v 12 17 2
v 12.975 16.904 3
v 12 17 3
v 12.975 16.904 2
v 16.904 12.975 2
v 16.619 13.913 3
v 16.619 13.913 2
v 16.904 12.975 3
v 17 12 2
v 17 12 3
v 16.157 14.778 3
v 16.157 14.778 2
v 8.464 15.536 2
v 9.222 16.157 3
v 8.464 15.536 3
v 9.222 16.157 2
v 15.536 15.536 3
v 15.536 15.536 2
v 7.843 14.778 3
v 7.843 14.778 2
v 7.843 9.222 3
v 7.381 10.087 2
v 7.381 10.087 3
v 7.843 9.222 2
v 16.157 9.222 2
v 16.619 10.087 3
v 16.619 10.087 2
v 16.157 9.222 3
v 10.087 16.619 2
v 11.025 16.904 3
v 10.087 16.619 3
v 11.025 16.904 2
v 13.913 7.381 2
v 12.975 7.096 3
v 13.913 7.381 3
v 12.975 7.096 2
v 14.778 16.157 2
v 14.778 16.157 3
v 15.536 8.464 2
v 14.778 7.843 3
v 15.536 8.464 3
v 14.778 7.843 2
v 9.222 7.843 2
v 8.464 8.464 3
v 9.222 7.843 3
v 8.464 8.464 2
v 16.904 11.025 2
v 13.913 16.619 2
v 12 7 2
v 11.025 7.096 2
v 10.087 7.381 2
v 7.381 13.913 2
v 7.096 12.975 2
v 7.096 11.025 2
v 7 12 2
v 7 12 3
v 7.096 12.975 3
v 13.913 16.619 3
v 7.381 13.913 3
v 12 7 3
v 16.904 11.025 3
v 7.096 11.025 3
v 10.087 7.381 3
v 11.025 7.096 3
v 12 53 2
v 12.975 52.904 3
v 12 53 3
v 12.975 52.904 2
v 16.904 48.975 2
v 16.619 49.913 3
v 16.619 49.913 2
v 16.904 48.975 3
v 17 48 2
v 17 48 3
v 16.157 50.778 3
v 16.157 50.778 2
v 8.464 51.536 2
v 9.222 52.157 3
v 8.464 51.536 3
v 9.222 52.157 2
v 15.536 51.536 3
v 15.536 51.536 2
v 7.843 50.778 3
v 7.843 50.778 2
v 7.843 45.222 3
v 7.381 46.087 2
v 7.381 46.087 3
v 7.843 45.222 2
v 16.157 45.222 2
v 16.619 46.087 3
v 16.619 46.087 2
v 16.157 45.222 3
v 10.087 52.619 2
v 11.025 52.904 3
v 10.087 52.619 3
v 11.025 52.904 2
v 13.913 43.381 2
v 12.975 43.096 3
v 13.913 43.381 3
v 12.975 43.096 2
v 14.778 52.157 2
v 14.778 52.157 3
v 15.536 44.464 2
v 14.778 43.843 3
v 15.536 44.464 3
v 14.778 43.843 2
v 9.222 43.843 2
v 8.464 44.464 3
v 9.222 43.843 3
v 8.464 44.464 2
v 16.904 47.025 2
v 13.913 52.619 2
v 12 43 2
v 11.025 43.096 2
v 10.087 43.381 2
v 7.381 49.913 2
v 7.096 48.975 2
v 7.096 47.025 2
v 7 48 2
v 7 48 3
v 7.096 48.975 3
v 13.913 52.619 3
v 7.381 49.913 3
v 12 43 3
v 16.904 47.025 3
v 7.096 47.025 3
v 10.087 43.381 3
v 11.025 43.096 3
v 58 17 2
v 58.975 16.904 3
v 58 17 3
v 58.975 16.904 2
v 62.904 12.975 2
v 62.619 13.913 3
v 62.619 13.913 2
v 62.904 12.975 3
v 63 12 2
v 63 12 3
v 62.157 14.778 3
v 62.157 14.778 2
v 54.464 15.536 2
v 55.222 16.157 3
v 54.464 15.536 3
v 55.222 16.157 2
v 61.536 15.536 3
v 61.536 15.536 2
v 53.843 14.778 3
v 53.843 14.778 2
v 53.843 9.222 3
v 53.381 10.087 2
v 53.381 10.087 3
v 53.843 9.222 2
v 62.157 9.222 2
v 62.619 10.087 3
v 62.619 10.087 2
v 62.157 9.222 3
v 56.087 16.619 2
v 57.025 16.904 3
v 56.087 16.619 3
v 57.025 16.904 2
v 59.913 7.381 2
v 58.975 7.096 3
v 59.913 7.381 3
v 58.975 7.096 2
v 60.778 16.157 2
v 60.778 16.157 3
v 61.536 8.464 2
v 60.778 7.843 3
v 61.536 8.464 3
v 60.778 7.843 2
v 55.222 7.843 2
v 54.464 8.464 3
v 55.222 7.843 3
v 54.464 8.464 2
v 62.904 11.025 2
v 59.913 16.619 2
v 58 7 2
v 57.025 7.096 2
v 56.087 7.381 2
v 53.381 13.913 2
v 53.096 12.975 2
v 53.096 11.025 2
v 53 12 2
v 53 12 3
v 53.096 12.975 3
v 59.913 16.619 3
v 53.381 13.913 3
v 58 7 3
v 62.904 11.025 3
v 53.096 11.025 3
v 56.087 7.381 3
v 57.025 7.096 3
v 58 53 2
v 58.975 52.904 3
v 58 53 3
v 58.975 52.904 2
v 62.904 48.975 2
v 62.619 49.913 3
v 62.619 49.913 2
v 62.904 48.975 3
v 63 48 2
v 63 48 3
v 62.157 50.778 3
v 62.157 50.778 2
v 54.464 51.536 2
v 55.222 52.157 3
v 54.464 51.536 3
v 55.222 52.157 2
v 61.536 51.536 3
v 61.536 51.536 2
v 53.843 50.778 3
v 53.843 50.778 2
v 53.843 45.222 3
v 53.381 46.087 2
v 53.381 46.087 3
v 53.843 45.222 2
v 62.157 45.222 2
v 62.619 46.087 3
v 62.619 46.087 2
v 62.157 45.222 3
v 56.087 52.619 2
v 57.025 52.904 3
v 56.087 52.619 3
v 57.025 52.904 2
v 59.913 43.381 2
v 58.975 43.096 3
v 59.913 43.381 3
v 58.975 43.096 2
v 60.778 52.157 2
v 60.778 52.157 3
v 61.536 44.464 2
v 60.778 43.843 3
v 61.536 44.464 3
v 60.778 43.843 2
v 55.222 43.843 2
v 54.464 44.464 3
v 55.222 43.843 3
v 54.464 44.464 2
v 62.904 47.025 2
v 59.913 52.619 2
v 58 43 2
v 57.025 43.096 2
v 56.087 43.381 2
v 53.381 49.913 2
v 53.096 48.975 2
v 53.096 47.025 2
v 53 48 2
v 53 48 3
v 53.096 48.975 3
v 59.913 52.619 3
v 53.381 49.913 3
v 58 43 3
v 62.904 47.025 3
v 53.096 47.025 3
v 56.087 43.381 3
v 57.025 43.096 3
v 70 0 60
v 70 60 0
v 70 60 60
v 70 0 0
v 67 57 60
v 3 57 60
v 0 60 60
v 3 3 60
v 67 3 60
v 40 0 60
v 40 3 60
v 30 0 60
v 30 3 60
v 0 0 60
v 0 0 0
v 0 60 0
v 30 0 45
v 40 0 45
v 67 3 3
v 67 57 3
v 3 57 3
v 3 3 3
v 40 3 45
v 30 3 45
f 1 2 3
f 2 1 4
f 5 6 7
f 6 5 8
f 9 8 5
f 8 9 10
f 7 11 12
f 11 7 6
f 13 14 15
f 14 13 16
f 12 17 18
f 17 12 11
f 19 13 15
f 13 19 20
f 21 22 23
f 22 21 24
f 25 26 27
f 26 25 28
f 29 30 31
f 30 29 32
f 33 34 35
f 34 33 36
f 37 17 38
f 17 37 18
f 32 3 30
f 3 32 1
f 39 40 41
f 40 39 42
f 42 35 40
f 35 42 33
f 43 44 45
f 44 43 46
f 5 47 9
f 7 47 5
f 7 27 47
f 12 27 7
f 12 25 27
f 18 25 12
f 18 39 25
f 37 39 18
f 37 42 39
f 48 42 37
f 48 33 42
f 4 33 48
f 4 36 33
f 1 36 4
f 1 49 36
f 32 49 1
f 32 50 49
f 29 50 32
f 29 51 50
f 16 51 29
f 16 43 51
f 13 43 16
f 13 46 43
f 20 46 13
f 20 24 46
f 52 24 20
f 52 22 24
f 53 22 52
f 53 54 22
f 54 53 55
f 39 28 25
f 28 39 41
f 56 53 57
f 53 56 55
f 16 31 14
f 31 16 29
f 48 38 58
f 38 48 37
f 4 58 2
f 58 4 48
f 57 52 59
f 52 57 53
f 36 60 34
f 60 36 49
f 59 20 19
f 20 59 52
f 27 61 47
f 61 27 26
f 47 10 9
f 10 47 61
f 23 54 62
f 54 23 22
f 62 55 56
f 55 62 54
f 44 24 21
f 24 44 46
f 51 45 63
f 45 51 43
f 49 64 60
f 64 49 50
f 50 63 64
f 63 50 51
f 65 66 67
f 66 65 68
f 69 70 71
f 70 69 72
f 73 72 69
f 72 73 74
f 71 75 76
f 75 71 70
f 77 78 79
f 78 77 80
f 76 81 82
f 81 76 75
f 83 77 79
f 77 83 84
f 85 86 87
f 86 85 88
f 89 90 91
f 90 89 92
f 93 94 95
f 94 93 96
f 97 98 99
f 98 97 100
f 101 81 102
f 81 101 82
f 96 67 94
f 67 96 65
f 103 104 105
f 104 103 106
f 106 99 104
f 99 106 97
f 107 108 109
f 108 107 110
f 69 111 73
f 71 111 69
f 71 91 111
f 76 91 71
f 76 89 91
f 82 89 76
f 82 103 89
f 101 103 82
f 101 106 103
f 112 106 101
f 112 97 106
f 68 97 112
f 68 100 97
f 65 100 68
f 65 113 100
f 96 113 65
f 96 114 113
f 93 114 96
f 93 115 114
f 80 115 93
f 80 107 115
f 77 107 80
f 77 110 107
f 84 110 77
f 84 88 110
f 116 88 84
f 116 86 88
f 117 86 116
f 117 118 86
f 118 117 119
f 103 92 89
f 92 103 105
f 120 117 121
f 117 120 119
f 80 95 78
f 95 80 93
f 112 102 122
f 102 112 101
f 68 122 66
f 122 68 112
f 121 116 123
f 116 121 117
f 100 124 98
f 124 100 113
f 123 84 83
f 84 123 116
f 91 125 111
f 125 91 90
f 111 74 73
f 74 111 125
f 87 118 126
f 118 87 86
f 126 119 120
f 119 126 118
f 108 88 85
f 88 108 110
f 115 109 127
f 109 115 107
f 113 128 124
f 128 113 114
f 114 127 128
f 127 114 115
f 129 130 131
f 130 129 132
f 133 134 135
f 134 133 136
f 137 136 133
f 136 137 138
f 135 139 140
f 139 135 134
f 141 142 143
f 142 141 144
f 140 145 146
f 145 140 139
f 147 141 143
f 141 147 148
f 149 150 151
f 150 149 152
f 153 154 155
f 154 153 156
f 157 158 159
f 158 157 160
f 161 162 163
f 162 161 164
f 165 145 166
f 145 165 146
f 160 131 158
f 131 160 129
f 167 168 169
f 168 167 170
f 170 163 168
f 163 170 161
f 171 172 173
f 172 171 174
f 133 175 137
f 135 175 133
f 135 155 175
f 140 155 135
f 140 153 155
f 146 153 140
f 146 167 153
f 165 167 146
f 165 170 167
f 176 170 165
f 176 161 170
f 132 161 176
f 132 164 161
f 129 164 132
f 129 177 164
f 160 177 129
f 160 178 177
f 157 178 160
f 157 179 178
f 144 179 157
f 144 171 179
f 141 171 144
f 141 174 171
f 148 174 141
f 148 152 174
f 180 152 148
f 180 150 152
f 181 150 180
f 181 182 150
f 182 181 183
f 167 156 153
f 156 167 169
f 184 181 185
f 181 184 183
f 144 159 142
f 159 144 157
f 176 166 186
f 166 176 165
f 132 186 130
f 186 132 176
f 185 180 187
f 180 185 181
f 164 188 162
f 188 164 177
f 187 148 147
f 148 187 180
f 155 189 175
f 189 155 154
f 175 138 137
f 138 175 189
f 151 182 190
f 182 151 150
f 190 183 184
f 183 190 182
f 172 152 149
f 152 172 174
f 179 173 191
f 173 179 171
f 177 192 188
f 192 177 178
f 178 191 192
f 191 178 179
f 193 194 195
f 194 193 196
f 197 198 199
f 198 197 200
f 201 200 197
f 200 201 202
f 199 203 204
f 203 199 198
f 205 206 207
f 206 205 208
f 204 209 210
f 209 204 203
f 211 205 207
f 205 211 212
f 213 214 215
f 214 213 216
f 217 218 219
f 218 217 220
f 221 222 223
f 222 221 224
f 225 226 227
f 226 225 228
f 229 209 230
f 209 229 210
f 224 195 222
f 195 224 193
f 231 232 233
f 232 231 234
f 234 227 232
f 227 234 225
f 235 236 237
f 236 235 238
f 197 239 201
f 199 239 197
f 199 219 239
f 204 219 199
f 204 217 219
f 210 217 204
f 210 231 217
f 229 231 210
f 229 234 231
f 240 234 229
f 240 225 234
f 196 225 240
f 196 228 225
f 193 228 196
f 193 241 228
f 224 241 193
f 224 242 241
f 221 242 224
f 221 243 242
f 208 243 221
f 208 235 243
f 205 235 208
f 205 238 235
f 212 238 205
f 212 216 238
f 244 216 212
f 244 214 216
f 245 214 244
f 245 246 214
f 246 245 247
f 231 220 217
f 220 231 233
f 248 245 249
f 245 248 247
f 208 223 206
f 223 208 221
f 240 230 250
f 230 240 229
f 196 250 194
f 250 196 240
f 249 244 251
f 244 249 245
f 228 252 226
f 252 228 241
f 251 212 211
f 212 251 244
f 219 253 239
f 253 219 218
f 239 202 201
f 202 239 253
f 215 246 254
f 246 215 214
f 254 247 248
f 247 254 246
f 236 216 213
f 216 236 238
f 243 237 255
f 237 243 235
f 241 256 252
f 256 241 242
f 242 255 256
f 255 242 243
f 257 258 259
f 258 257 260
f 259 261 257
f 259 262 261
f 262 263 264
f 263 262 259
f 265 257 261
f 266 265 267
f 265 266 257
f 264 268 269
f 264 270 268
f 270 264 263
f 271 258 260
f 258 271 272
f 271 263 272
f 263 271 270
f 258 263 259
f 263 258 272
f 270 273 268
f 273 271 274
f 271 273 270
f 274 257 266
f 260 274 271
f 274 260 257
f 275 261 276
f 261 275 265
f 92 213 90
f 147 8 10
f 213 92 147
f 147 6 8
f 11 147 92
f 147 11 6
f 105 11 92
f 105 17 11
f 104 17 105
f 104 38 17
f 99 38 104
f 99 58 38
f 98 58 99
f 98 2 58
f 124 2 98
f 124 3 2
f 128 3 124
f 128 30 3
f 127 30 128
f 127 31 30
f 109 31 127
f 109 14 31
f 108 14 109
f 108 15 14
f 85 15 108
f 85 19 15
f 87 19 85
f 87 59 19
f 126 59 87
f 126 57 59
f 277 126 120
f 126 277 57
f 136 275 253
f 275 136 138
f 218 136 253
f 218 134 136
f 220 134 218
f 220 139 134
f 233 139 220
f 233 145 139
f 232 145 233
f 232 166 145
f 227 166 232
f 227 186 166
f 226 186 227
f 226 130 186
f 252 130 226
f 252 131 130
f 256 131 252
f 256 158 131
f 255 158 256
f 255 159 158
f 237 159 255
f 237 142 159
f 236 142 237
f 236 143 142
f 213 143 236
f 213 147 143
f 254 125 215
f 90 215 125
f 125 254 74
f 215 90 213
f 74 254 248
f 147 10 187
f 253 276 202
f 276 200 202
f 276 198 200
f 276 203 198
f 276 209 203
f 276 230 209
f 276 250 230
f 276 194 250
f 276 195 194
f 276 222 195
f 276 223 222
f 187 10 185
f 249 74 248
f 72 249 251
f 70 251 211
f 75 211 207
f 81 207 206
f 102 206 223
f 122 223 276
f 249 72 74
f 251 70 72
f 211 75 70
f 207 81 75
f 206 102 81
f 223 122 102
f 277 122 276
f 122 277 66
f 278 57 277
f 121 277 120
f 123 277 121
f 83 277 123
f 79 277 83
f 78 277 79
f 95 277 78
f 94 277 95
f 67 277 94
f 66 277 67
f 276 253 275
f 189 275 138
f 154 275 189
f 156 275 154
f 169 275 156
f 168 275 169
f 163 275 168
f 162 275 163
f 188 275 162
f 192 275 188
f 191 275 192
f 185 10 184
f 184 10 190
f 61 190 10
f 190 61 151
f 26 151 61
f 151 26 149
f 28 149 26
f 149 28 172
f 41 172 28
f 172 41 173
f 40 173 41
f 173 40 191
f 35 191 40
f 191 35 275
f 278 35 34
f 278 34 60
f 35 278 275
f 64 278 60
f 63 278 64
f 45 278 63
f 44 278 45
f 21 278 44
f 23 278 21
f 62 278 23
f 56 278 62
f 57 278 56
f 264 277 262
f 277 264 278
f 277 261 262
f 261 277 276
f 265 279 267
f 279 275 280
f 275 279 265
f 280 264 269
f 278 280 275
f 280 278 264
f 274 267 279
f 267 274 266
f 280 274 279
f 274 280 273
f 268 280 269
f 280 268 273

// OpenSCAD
$fn = 32;

// ----------------------------------------------------------------------
// Enclosure box: both enclosure
// ----------------------------------------------------------------------

// --- parameters (mm) ---
box_l = 70;               // outer length, X
box_w = 60;               // outer width, Y
box_h = 60;               // outer height
wall_t = 3;               // wall thickness
boss_r = 5;               // corner boss radius
hole_r = 2;               // boss screw hole radius
boss_in = 12;             // boss inset from the corners
notch_w = 10;             // cable notch width
notch_h = 15;             // cable notch height

inner_h = box_h - wall_t;  // cavity depth
boss_h = inner_h - 2;  // corner boss height

difference() {
  cube([box_l, box_w, box_h]);
  translate([wall_t, wall_t, wall_t])
    cube([box_l - 2 * wall_t, box_w - 2 * wall_t, box_h]);
  for (sx = [0, 1], sy = [0, 1])
    translate([sx ? box_l - boss_in : boss_in,
               sy ? box_w - boss_in : boss_in, wall_t - 1]) {
      cylinder(r = boss_r, h = boss_h);
      translate([0, 0, boss_h - 4])
        cylinder(r = hole_r, h = 5);
    }
  translate([box_l / 2 - notch_w / 2, -1, box_h - notch_h])
    cube([notch_w, wall_t + 2, notch_h + 1]);
}
